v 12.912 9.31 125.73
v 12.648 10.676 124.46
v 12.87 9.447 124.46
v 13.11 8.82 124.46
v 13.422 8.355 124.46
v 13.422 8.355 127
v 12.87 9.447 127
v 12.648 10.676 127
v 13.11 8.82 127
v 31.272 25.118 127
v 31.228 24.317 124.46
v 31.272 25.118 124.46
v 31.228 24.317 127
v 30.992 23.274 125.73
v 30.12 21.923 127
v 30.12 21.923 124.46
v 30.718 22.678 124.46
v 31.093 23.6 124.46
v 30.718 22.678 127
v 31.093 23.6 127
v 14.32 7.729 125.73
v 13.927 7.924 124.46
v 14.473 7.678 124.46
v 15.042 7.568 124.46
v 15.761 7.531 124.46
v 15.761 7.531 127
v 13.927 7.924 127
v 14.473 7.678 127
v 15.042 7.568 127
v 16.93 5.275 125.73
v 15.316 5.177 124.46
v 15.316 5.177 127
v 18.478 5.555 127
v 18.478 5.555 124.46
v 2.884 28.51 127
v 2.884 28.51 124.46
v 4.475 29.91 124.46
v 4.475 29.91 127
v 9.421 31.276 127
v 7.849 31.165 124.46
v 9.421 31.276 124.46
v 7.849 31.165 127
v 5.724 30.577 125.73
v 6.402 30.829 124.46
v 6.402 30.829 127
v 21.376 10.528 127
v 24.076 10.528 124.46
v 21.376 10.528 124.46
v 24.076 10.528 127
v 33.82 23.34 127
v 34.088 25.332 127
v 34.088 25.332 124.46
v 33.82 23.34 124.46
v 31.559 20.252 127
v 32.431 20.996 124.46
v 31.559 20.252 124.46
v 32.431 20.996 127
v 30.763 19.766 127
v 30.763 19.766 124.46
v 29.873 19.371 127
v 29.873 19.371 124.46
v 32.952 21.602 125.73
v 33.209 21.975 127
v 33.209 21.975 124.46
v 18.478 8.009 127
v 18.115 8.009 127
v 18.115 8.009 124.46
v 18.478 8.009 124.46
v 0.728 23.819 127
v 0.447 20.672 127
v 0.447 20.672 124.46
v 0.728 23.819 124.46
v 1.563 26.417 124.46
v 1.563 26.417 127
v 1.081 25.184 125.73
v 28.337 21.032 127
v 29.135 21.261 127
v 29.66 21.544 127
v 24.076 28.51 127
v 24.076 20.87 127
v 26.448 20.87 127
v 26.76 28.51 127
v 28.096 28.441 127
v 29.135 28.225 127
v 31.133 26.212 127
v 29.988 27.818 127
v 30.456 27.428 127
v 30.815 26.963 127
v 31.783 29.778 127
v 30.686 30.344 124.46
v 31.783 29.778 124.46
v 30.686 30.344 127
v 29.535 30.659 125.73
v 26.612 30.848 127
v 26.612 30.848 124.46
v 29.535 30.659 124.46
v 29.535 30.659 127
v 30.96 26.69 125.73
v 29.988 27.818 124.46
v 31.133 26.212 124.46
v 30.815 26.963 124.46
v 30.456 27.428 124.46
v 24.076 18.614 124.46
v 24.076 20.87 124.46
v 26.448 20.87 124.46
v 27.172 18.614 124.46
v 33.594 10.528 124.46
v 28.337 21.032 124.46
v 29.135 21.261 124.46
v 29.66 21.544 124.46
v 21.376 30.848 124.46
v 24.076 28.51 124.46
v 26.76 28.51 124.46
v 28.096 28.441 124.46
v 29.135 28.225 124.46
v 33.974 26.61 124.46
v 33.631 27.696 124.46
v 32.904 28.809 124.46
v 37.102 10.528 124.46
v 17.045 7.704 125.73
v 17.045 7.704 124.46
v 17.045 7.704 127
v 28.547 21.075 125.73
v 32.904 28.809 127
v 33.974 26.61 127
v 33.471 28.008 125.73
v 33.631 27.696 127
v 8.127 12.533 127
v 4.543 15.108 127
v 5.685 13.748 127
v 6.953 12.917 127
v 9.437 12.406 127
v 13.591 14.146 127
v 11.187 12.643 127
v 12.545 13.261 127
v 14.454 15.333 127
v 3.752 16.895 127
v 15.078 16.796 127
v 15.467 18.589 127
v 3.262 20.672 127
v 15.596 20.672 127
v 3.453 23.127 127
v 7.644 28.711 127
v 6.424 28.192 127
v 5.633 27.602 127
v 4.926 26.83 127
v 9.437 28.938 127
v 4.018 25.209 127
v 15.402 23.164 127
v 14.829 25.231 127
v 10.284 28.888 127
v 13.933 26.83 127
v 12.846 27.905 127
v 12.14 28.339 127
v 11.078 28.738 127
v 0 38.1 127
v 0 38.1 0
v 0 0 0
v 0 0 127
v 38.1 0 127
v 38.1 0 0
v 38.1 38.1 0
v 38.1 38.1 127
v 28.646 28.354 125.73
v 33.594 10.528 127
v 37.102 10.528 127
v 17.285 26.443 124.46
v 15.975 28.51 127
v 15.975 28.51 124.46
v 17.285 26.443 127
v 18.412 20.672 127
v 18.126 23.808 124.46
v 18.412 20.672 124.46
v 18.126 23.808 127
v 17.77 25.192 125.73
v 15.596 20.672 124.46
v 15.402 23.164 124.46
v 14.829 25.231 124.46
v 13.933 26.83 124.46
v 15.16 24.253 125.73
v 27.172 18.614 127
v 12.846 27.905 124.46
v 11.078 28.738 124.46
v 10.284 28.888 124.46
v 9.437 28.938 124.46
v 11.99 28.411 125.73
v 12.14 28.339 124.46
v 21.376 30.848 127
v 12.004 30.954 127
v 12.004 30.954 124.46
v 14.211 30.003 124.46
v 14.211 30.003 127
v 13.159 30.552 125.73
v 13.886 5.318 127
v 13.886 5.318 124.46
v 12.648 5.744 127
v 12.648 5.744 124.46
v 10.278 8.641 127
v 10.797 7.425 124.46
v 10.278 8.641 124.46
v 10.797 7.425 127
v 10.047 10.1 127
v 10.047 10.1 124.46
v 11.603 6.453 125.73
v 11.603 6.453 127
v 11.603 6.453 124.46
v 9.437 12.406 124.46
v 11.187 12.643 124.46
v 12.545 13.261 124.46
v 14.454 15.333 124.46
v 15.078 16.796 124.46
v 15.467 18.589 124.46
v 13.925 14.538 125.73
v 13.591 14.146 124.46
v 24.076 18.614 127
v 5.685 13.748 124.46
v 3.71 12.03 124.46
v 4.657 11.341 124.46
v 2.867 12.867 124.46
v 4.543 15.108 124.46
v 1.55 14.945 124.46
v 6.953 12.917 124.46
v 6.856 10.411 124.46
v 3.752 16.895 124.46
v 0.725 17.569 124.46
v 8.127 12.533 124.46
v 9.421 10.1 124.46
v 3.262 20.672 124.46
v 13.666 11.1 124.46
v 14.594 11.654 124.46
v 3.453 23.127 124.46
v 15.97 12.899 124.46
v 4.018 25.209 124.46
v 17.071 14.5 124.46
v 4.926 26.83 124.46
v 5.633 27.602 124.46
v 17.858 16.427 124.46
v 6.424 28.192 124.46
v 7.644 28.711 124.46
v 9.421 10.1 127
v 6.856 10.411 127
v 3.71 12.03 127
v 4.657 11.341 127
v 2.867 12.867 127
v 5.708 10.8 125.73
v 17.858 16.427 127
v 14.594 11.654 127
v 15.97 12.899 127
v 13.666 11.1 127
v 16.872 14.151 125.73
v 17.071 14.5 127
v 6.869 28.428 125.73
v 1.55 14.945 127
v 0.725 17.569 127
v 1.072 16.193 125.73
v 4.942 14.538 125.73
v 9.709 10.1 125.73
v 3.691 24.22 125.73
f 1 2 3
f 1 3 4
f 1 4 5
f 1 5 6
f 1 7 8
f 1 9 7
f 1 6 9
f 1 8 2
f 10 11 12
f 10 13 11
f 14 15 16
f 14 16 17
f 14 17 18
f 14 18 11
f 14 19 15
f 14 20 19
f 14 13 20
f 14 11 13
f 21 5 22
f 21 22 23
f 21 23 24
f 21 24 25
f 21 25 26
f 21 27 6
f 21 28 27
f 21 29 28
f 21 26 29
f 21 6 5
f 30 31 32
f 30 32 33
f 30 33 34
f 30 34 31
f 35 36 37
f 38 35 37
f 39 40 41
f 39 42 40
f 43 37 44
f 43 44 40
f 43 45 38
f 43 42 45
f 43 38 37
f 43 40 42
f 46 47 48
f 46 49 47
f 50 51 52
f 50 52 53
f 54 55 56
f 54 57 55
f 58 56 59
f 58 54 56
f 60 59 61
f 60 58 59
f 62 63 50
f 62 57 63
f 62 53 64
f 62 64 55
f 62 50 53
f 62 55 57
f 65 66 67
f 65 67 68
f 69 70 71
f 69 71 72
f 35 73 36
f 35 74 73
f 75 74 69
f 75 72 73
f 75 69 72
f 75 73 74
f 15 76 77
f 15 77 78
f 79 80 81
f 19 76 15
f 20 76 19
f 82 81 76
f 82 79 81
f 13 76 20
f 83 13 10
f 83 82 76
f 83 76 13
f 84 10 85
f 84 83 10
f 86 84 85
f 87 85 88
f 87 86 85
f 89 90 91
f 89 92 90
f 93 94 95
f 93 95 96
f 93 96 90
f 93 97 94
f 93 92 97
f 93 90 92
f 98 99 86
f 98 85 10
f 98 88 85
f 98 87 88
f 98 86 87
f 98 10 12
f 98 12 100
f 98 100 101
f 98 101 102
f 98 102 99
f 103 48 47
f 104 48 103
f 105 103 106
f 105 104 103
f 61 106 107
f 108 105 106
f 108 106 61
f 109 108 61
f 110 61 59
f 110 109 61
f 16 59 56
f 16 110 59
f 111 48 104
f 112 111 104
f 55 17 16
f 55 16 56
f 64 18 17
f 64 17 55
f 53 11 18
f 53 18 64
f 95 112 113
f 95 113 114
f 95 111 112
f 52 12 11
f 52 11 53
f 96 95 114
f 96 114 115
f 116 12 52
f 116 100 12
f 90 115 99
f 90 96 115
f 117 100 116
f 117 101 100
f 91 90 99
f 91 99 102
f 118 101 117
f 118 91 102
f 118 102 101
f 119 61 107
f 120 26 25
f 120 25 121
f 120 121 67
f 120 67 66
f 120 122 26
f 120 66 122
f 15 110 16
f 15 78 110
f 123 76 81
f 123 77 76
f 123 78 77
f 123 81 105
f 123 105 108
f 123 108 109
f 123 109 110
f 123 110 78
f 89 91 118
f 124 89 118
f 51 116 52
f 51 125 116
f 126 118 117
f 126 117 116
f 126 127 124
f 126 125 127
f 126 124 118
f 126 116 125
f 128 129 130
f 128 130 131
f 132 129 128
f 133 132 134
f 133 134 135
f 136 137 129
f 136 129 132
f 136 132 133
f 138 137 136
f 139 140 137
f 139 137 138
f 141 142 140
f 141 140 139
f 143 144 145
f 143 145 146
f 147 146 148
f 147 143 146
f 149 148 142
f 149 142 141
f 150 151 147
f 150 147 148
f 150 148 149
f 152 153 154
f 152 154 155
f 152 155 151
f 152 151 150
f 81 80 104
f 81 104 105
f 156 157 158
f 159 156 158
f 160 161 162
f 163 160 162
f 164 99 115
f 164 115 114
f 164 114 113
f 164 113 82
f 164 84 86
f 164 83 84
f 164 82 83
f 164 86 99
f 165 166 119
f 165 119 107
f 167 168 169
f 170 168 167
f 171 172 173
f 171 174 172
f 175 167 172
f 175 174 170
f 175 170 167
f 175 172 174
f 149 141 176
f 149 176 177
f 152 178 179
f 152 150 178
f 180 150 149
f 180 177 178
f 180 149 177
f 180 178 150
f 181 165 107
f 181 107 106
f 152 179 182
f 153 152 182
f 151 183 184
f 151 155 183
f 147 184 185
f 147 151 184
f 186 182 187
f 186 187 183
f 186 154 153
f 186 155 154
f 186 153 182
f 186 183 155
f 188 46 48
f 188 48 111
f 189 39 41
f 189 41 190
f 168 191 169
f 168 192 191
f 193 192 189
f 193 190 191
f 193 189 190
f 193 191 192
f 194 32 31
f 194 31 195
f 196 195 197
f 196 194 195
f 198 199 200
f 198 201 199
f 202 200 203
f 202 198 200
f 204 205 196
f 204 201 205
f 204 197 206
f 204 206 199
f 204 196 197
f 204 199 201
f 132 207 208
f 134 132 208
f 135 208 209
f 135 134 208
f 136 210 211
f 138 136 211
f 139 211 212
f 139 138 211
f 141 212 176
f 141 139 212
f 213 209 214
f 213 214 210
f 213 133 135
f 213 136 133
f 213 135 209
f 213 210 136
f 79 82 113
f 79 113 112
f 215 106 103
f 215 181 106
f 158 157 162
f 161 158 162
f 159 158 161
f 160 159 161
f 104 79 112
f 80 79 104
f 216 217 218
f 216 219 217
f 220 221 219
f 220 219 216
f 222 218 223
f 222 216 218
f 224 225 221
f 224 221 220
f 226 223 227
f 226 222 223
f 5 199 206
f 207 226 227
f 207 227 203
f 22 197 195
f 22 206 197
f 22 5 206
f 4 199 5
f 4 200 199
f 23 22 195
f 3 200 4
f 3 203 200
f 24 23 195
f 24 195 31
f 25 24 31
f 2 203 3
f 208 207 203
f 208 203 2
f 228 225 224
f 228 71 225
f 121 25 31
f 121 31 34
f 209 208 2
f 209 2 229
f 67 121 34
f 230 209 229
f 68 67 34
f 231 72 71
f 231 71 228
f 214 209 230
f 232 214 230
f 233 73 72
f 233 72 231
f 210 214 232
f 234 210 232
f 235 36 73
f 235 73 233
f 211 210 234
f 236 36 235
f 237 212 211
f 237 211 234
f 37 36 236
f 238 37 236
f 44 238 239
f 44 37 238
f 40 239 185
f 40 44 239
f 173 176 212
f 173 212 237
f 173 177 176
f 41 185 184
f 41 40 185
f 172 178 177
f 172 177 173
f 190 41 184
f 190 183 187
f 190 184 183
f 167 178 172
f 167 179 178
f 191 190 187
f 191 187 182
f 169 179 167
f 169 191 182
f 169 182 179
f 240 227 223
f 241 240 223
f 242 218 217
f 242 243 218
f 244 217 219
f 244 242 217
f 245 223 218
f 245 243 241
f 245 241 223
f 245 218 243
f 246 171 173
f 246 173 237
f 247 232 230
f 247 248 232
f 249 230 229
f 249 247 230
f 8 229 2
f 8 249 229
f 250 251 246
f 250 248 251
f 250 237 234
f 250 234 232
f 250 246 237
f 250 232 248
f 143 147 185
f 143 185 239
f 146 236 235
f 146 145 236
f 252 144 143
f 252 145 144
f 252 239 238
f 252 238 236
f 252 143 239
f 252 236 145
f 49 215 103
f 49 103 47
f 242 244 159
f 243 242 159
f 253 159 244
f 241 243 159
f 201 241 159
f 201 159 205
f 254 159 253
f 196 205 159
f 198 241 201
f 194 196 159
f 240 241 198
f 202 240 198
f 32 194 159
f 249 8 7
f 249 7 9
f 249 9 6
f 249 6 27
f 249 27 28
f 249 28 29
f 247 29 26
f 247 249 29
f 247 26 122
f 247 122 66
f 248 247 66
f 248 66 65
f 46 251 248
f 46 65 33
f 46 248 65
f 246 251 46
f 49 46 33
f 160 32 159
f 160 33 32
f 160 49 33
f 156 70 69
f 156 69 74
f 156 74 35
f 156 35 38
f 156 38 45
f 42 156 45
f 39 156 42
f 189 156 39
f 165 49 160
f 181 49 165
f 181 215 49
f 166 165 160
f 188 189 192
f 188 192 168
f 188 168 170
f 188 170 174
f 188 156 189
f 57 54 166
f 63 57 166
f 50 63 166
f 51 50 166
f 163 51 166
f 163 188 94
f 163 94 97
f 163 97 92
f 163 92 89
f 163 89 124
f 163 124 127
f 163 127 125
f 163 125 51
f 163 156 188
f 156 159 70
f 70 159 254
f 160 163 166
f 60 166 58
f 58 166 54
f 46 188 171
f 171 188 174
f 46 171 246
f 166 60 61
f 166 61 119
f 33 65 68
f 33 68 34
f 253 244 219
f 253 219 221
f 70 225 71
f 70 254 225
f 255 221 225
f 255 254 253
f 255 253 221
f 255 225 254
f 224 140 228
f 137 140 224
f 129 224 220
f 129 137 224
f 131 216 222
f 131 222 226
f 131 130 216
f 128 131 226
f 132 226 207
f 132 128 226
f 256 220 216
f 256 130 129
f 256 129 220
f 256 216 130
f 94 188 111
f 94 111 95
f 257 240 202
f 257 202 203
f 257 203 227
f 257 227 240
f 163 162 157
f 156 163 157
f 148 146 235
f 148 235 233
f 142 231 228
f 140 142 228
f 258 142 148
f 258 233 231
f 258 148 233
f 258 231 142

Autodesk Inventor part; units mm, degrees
ref_plane "YZ Plane" through (0, 0, 0) normal (1, 0, 0) x (0, 1, 0)
ref_plane "XZ Plane" through (0, 0, 0) normal (0, 1, 0) x (-1, 0, 0)
ref_plane "XY Plane" through (0, 0, 0) normal (0, 0, 1) x (1, 0, 0)
sketch "Sketch1" plane through (0, 0, 0) normal (0, 0, 1) x (1, 0, 0)
  line L0 (0, 0) -> (38.1, 0)
  line L1 (38.1, 0) -> (38.1, 38.1)
  line L2 (38.1, 38.1) -> (0, 38.1)
  line L3 (0, 38.1) -> (0, 0)
  dimension "d0" = 38.1
  dimension "d1" = 38.1
extrude "Extrusion1" add sketch "Sketch1" along normal blind 127
sketch "Sketch2" plane through (0, 0, 127) normal (0, 0, 1) x (1, 0, 0)
  line L0 (-0.4591, 31.2765) -> (45.936, 31.2765) construction
  line L1 (45.936, 31.2765) -> (45.936, -1.3483) construction
  line L2 (45.936, -1.3483) -> (-0.4591, -1.3483) construction
  line L3 (-0.4591, -1.3483) -> (-0.4591, 31.2765) construction
  spline S0 degree 2 poles (18.4777, 5.5554) (17.7367, 5.3742) (16.1229, 5.1766) (15.3161, 5.1766) knots 0 0 0 1 2 2 2
  spline S1 degree 2 poles (15.3161, 5.1766) (13.0272, 5.1766) (10.1784, 7.729) (10.0467, 10.1002) knots 0 0 0 1 2 2 2
  spline S2 degree 2 poles (10.0467, 10.1002) (9.8656, 10.1002) (9.5527, 10.1002) (9.421, 10.1002) knots 0 0 0 1 2 2 2
  spline S3 degree 2 poles (9.421, 10.1002) (7.3626, 10.1002) (4.0528, 11.4999) (2.8672, 12.8666) knots 0 0 0 1 2 2 2
  spline S4 degree 2 poles (2.8672, 12.8666) (1.698, 14.2169) (0.4466, 18.1689) (0.4466, 20.6719) knots 0 0 0 1 2 2 2
  spline S5 degree 2 poles (0.4466, 20.6719) (0.4466, 23.2407) (1.7145, 27.1269) (2.8837, 28.5101) knots 0 0 0 1 2 2 2
  spline S6 degree 2 poles (2.8837, 28.5101) (4.0693, 29.8768) (7.3791, 31.2765) (9.421, 31.2765) knots 0 0 0 1 2 2 2
  spline S7 degree 2 poles (9.421, 31.2765) (11.4958, 31.2765) (14.8221, 29.8274) (15.9747, 28.5101) knots 0 0 0 1 2 2 2
  spline S8 degree 2 poles (15.9747, 28.5101) (17.1274, 27.1763) (18.4118, 23.2078) (18.4118, 20.6719) knots 0 0 0 1 2 2 2
  spline S9 degree 2 poles (18.4118, 20.6719) (18.4118, 16.7198) (15.3325, 11.5822) (12.6485, 10.6765) knots 0 0 0 1 2 2 2
  spline S10 degree 2 poles (12.6485, 10.6765) (12.7143, 9.9191) (13.1095, 8.7005) (13.4224, 8.3547) knots 0 0 0 1 2 2 2
  spline S11 degree 2 poles (13.4224, 8.3547) (13.8011, 7.9266) (14.8385, 7.5314) (15.7607, 7.5314) knots 0 0 0 1 2 2 2
  spline S12 degree 2 poles (15.7607, 7.5314) (16.3041, 7.5314) (17.7861, 7.8772) (18.1154, 8.0089) knots 0 0 0 1 2 2 2
  line L4 (18.1154, 8.0089) -> (18.4777, 8.0089)
  line L5 (18.4777, 8.0089) -> (18.4777, 5.5554)
  spline S13 degree 2 poles (15.596, 20.6719) (15.596, 22.6973) (14.7233, 25.8095) (13.9329, 26.8304) knots 0 0 0 1 2 2 2
  spline S14 degree 2 poles (13.9329, 26.8304) (13.126, 27.8843) (10.8536, 28.9382) (9.4374, 28.9382) knots 0 0 0 1 2 2 2
  spline S15 degree 2 poles (9.4374, 28.9382) (7.9719, 28.9382) (5.7653, 27.9173) (4.9255, 26.8304) knots 0 0 0 1 2 2 2
  spline S16 degree 2 poles (4.9255, 26.8304) (4.1187, 25.793) (3.2624, 22.6479) (3.2624, 20.6719) knots 0 0 0 1 2 2 2
  spline S17 degree 2 poles (3.2624, 20.6719) (3.2624, 16.6704) (6.6216, 12.4056) (9.4374, 12.4056) knots 0 0 0 1 2 2 2
  spline S18 degree 2 poles (9.4374, 12.4056) (12.2532, 12.4056) (15.596, 16.6704) (15.596, 20.6719) knots 0 0 0 1 2 2 2
  line L6 (37.1016, 10.5283) -> (33.5942, 10.5283)
  line L7 (33.5942, 10.5283) -> (27.1721, 18.6135)
  line L8 (27.1721, 18.6135) -> (24.0764, 18.6135)
  line L9 (24.0764, 18.6135) -> (24.0764, 10.5283)
  line L10 (24.0764, 10.5283) -> (21.3758, 10.5283)
  line L11 (21.3758, 10.5283) -> (21.3758, 30.8483)
  line L12 (21.3758, 30.8483) -> (26.6123, 30.8483)
  spline S19 degree 2 poles (26.6123, 30.8483) (28.3578, 30.8483) (30.7125, 30.4696) (31.7828, 29.778) knots 0 0 0 1 2 2 2
  spline S20 degree 2 poles (31.7828, 29.778) (32.8532, 29.0864) (34.0882, 26.9292) (34.0882, 25.332) knots 0 0 0 1 2 2 2
  spline S21 degree 2 poles (34.0882, 25.332) (34.0882, 23.109) (31.8158, 20.0955) (29.8727, 19.371) knots 0 0 0 1 2 2 2
  line L13 (29.8727, 19.371) -> (37.1016, 10.5283)
  spline S22 degree 2 poles (31.2724, 25.1179) (31.2724, 26.0071) (30.6466, 27.3739) (29.988, 27.8185) knots 0 0 0 1 2 2 2
  spline S23 degree 2 poles (29.988, 27.8185) (29.4116, 28.1972) (27.8802, 28.5101) (26.7605, 28.5101) knots 0 0 0 1 2 2 2
  line L14 (26.7605, 28.5101) -> (24.0764, 28.5101)
  line L15 (24.0764, 28.5101) -> (24.0764, 20.8695)
  line L16 (24.0764, 20.8695) -> (26.4476, 20.8695)
  spline S24 degree 2 poles (26.4476, 20.8695) (27.6168, 20.8695) (29.4775, 21.2811) (30.1197, 21.9233) knots 0 0 0 1 2 2 2
  spline S25 degree 2 poles (30.1197, 21.9233) (30.7125, 22.4832) (31.2724, 24.064) (31.2724, 25.1179) knots 0 0 0 1 2 2 2
  point P0 (0, 0)
extrude "Extrusion2" cut sketch "Sketch2" against normal blind 2.54
properties part number "Container 2 2 5 QR color 5"
